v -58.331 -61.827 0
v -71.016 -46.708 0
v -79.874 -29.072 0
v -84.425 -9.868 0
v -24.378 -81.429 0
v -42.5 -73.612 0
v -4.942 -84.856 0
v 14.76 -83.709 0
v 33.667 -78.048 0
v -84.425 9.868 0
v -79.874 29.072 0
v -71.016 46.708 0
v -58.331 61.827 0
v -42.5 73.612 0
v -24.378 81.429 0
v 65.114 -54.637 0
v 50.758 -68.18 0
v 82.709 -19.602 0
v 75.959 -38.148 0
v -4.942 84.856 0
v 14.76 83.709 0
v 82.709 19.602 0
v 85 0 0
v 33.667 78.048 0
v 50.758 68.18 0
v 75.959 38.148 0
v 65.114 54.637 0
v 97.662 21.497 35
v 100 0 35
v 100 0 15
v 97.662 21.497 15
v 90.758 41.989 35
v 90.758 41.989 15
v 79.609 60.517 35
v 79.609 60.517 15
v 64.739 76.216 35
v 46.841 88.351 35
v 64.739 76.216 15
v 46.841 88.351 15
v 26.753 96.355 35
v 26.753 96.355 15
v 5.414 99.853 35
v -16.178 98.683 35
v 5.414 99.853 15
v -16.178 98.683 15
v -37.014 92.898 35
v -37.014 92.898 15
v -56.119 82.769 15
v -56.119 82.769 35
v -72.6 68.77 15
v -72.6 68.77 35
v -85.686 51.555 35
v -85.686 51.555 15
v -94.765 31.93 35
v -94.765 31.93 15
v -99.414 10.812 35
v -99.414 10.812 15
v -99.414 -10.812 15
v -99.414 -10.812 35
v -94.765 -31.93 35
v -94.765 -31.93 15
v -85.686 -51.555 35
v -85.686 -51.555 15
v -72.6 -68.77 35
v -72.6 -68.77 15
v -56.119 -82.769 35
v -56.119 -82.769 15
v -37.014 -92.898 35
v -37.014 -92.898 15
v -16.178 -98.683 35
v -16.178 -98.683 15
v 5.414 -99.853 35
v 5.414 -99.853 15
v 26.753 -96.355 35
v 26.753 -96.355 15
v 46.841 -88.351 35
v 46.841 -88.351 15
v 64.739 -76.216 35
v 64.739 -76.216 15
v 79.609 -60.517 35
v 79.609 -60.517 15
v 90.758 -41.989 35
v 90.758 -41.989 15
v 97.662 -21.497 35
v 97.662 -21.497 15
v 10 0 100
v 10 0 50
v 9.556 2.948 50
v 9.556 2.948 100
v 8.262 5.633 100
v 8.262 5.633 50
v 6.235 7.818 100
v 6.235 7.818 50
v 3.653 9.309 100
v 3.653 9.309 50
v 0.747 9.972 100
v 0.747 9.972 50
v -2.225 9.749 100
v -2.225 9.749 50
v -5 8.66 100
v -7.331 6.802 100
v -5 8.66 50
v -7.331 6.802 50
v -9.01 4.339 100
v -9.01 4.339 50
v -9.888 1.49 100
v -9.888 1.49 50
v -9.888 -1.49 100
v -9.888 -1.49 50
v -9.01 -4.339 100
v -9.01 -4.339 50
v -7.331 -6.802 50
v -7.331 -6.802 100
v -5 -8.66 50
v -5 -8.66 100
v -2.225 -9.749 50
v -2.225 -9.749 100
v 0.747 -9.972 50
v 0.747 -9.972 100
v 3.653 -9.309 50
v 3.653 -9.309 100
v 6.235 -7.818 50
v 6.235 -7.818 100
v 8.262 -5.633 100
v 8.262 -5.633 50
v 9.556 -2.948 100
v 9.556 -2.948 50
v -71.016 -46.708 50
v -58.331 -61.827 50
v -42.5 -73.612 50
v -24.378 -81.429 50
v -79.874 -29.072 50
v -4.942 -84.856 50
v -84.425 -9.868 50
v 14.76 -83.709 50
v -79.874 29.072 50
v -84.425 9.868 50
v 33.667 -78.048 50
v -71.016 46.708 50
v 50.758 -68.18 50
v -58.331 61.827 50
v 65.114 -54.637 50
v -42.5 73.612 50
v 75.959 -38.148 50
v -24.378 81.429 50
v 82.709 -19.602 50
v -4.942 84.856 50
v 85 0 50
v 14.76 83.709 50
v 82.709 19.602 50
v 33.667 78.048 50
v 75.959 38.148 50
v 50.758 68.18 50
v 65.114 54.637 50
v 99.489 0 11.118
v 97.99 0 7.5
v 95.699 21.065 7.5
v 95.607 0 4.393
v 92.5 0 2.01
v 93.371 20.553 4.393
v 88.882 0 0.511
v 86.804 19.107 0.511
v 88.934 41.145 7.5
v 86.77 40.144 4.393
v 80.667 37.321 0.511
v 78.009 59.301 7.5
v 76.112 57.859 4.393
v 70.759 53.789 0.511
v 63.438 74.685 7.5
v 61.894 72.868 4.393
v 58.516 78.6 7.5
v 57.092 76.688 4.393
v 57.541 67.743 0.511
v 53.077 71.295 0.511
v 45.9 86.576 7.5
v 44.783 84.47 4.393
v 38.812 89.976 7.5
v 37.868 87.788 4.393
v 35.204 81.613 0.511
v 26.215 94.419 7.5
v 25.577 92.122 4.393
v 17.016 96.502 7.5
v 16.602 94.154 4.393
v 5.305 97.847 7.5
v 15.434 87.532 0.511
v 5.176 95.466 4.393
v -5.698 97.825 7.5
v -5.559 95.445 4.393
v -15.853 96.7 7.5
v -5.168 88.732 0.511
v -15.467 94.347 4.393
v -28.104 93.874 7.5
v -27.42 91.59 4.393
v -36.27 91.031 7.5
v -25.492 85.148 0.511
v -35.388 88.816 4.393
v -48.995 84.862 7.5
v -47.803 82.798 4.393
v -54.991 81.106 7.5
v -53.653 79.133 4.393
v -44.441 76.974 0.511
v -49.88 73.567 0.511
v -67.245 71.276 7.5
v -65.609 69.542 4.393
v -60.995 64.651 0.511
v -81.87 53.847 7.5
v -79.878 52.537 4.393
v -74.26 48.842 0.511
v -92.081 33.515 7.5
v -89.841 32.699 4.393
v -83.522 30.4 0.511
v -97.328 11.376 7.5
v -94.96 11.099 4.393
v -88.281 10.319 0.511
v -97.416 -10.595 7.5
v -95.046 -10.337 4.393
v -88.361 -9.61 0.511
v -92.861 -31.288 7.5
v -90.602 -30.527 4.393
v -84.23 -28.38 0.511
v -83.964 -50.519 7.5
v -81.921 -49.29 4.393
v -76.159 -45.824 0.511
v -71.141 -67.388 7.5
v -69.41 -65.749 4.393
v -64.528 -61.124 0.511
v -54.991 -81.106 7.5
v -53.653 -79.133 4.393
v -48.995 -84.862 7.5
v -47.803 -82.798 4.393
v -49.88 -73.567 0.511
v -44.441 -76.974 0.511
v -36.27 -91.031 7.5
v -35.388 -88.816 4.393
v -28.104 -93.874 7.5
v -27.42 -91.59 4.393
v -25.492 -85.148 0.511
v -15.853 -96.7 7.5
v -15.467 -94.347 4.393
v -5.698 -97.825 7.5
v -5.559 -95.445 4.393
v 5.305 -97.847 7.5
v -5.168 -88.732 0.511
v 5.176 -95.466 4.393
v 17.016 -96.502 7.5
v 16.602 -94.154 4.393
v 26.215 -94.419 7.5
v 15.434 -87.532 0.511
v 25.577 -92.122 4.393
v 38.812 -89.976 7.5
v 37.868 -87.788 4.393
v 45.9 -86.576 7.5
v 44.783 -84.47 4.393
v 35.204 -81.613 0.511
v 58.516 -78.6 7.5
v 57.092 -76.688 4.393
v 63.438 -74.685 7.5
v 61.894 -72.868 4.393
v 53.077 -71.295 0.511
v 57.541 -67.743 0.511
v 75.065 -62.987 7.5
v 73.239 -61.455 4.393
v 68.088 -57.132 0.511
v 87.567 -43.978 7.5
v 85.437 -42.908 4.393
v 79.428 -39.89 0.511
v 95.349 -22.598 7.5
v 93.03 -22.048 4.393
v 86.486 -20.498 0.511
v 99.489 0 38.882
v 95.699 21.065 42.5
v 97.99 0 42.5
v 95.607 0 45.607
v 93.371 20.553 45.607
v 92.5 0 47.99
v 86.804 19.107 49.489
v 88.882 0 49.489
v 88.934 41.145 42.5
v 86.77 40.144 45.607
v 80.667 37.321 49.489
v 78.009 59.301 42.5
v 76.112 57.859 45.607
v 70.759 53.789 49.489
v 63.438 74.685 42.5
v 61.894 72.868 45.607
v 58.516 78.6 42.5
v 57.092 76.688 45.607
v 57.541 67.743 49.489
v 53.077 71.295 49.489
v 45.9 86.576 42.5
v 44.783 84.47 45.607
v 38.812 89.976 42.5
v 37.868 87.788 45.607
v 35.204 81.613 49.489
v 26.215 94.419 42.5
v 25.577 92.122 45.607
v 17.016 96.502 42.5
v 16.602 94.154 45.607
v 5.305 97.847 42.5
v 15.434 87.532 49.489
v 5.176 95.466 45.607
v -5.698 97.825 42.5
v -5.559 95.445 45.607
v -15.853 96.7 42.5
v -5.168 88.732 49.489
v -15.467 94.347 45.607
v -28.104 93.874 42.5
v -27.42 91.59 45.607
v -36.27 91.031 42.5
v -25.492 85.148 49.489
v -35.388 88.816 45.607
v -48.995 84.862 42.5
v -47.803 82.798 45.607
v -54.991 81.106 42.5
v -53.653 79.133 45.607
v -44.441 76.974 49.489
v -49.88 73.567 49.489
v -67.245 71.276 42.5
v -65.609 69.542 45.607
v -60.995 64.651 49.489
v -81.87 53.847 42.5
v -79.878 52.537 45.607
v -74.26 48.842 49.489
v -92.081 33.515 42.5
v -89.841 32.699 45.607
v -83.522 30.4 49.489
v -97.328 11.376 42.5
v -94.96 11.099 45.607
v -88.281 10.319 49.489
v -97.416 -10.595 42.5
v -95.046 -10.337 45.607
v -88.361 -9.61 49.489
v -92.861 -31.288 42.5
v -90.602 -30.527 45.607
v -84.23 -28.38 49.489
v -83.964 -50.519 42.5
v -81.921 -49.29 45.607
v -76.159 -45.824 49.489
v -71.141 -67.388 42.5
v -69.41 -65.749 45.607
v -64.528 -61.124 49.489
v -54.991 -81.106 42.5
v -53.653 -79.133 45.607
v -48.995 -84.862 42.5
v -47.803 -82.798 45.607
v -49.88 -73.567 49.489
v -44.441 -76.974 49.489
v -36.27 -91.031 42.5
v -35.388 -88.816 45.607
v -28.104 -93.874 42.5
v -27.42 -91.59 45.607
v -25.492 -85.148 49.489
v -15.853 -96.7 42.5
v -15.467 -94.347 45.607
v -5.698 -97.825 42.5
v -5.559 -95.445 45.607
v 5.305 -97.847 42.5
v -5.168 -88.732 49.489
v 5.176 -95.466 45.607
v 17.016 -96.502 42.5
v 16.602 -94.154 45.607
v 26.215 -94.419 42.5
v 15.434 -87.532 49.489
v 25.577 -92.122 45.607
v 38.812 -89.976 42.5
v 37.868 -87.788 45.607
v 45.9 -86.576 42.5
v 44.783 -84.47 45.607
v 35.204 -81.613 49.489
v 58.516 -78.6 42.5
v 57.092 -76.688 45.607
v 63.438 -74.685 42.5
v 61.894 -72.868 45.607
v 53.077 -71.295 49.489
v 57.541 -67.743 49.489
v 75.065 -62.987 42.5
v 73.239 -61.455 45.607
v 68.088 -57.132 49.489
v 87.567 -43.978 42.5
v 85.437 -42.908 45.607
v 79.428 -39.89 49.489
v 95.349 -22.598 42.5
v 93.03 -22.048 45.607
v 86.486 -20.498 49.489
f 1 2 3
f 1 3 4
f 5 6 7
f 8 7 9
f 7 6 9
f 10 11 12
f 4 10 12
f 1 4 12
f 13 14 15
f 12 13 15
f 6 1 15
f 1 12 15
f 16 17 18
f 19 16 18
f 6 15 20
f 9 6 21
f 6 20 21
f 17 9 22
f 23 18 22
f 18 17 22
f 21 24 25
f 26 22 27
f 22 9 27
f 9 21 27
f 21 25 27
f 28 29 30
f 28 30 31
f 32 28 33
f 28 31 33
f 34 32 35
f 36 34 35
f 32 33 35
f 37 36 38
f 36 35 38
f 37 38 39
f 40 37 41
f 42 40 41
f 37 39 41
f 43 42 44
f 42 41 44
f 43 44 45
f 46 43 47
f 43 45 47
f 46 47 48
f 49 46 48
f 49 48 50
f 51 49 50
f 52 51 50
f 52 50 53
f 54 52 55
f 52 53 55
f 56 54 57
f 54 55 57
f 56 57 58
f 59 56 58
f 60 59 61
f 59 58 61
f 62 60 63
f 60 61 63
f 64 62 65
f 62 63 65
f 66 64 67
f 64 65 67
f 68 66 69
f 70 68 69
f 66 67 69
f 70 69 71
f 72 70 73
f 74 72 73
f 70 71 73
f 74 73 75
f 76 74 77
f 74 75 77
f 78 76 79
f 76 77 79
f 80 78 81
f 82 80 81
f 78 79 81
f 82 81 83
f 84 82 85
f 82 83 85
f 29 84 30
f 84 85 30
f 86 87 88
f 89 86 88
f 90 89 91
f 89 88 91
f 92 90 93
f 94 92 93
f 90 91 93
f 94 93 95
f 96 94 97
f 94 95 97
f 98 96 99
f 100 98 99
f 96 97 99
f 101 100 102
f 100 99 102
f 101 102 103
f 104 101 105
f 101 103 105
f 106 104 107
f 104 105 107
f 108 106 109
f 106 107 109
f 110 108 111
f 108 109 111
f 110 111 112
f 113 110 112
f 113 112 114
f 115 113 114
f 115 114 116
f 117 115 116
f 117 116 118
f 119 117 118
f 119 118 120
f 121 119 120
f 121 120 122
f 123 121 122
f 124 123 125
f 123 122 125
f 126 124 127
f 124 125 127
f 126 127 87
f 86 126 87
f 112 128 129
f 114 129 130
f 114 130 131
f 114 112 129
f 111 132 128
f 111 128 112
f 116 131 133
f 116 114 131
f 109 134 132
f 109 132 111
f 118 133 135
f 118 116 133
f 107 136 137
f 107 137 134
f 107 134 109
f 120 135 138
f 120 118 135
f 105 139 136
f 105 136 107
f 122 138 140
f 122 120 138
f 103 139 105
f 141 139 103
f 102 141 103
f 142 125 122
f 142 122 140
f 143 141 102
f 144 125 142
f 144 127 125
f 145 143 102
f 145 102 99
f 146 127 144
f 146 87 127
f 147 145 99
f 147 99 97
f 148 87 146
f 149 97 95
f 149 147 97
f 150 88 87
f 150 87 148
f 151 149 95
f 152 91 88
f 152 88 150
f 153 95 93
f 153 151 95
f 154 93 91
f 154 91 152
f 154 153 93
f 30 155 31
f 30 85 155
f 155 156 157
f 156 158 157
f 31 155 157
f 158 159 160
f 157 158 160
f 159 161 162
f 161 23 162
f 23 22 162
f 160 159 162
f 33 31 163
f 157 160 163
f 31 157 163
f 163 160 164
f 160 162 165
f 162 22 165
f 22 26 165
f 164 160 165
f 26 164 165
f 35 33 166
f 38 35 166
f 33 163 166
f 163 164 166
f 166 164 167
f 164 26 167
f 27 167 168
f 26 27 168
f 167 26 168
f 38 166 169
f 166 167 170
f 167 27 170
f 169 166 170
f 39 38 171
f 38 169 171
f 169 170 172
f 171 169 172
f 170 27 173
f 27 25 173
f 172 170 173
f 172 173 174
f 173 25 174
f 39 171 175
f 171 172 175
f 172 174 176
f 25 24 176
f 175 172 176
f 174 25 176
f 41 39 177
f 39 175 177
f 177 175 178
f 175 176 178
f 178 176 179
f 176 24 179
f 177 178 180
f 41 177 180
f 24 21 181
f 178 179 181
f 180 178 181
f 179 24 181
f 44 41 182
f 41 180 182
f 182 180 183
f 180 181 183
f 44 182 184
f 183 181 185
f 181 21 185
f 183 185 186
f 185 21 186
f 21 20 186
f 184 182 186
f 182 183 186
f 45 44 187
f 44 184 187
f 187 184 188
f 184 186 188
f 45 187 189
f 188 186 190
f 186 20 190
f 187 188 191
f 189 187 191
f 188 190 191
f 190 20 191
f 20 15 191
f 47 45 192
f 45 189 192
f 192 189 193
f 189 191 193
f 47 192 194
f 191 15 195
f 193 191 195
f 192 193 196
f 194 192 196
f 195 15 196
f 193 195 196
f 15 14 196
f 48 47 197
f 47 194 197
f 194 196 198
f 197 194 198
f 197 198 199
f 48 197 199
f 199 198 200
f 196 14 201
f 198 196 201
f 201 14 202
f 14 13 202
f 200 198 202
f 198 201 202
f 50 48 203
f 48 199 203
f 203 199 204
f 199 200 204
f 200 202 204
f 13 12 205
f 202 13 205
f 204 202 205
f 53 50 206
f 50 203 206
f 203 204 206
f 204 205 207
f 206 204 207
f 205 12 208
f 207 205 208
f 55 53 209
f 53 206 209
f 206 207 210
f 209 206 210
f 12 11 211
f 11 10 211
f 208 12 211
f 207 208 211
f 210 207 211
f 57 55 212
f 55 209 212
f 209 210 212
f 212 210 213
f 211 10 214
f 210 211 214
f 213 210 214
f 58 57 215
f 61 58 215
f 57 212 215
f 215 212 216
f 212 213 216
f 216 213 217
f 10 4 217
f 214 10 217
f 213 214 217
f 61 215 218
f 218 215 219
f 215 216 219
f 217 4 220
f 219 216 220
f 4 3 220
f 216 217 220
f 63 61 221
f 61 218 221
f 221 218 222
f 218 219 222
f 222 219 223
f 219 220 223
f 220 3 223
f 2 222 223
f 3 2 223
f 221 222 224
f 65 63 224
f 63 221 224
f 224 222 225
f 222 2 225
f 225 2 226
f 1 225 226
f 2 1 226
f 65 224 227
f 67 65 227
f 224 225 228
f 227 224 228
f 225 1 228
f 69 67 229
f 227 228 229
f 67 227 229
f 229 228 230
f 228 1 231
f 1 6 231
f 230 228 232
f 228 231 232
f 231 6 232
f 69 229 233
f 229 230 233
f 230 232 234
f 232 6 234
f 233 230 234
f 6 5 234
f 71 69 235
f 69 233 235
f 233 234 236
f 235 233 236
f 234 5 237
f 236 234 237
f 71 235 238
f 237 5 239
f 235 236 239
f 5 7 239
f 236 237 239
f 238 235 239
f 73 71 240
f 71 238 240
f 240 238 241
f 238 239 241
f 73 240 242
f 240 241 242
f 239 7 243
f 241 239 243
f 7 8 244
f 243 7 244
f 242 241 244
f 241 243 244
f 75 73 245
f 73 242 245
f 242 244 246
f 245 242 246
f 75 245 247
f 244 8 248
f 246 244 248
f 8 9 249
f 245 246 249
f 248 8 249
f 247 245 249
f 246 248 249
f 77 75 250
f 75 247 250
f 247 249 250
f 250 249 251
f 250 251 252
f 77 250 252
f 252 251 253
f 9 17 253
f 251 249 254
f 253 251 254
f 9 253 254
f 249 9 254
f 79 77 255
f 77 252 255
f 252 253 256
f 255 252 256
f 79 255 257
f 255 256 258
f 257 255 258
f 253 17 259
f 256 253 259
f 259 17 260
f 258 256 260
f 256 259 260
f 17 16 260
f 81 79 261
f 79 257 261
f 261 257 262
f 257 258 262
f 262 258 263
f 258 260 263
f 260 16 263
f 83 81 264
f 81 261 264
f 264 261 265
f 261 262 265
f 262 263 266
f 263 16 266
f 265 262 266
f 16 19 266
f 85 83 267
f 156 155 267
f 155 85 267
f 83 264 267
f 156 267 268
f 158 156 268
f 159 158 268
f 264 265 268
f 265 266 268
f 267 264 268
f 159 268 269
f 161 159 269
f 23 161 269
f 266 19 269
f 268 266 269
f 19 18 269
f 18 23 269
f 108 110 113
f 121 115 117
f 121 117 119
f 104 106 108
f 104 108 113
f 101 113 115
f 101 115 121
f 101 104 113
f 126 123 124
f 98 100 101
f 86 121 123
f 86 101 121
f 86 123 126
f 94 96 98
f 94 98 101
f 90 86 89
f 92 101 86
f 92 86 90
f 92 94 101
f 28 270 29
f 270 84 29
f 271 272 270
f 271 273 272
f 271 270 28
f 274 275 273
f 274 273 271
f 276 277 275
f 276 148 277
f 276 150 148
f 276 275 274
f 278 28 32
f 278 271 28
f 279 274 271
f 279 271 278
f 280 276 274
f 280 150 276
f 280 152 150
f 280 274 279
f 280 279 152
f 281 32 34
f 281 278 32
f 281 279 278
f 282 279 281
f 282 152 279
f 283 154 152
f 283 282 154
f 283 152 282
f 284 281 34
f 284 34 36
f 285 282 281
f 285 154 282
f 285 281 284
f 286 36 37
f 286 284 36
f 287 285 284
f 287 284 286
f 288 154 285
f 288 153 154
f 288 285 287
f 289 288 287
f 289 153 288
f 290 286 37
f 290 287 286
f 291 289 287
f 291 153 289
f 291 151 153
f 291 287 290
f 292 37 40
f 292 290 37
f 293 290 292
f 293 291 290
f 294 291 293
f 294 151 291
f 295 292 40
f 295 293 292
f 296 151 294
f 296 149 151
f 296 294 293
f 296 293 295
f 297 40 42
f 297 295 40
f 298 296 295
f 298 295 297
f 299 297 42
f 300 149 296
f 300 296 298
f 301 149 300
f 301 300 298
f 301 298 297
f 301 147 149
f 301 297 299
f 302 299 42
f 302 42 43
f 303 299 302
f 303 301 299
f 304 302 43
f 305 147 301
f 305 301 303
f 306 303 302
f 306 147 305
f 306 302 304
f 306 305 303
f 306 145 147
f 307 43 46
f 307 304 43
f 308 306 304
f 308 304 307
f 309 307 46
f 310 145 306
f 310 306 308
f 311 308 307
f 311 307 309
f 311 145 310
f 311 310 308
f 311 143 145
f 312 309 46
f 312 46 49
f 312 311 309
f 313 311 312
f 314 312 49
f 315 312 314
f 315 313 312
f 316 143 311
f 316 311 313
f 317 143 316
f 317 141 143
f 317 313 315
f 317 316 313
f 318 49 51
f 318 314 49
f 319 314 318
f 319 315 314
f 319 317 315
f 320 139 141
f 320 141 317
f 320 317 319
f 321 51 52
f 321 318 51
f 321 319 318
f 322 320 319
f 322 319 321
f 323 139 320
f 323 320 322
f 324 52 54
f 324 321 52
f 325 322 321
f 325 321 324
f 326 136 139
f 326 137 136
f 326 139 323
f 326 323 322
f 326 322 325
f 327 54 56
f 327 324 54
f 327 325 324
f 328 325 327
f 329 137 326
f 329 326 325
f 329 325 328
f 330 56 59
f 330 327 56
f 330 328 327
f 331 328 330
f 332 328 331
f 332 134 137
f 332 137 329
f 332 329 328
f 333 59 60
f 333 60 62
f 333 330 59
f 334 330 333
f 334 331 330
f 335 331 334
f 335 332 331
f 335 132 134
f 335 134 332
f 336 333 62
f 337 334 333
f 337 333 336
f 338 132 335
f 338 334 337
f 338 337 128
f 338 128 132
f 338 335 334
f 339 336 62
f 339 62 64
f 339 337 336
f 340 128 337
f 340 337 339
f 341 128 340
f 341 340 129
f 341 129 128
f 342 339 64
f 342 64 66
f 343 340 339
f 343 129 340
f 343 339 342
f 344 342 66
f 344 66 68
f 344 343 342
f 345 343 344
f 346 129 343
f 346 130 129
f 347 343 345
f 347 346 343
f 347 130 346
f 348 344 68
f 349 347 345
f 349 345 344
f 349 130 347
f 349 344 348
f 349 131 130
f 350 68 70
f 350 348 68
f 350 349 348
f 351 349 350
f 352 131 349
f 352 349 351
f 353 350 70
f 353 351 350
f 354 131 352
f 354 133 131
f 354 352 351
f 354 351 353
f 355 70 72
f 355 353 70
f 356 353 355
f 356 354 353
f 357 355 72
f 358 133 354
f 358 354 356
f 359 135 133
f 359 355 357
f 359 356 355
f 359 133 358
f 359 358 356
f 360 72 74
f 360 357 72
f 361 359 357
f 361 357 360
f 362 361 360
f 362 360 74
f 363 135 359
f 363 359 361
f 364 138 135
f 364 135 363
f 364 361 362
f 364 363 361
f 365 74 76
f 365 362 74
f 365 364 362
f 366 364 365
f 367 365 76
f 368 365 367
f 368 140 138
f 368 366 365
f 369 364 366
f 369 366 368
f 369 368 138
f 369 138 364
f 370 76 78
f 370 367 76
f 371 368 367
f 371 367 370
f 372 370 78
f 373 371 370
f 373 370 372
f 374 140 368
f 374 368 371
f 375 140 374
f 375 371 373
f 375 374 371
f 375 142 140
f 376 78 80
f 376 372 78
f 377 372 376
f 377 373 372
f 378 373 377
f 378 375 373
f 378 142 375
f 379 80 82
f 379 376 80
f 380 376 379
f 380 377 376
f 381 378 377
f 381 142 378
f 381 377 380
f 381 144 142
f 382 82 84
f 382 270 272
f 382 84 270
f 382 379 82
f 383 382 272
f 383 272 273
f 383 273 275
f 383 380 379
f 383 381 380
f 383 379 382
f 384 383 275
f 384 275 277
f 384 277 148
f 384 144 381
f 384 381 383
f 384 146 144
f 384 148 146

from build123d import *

# Parameters (mm, degrees)
SKETCH_1_R      = 100
EXTRUDE_1_DEPTH = 50
SKETCH_2_R      = 10
EXTRUDE_2_DEPTH = 50
FILLET_1_R      = 15


with BuildPart() as part:
    # 草图1 → 凸台-拉伸1 (new body)
    with BuildSketch(Plane.XY):
        Circle(SKETCH_1_R)
    extrude(amount=EXTRUDE_1_DEPTH)

    # 草图2 → 凸台-拉伸2 (add)
    with BuildSketch(Plane.XY.offset(50)):
        Circle(SKETCH_2_R)
    extrude(amount=EXTRUDE_2_DEPTH)

    # 圆角1
    fillet_1_edges = [part.edges().sort_by_distance(p)[0] for p in [
        (-100, 0, 0),
        (-100, 0, 50),
    ]]
    fillet(fillet_1_edges, radius=FILLET_1_R)


solid = part.part
